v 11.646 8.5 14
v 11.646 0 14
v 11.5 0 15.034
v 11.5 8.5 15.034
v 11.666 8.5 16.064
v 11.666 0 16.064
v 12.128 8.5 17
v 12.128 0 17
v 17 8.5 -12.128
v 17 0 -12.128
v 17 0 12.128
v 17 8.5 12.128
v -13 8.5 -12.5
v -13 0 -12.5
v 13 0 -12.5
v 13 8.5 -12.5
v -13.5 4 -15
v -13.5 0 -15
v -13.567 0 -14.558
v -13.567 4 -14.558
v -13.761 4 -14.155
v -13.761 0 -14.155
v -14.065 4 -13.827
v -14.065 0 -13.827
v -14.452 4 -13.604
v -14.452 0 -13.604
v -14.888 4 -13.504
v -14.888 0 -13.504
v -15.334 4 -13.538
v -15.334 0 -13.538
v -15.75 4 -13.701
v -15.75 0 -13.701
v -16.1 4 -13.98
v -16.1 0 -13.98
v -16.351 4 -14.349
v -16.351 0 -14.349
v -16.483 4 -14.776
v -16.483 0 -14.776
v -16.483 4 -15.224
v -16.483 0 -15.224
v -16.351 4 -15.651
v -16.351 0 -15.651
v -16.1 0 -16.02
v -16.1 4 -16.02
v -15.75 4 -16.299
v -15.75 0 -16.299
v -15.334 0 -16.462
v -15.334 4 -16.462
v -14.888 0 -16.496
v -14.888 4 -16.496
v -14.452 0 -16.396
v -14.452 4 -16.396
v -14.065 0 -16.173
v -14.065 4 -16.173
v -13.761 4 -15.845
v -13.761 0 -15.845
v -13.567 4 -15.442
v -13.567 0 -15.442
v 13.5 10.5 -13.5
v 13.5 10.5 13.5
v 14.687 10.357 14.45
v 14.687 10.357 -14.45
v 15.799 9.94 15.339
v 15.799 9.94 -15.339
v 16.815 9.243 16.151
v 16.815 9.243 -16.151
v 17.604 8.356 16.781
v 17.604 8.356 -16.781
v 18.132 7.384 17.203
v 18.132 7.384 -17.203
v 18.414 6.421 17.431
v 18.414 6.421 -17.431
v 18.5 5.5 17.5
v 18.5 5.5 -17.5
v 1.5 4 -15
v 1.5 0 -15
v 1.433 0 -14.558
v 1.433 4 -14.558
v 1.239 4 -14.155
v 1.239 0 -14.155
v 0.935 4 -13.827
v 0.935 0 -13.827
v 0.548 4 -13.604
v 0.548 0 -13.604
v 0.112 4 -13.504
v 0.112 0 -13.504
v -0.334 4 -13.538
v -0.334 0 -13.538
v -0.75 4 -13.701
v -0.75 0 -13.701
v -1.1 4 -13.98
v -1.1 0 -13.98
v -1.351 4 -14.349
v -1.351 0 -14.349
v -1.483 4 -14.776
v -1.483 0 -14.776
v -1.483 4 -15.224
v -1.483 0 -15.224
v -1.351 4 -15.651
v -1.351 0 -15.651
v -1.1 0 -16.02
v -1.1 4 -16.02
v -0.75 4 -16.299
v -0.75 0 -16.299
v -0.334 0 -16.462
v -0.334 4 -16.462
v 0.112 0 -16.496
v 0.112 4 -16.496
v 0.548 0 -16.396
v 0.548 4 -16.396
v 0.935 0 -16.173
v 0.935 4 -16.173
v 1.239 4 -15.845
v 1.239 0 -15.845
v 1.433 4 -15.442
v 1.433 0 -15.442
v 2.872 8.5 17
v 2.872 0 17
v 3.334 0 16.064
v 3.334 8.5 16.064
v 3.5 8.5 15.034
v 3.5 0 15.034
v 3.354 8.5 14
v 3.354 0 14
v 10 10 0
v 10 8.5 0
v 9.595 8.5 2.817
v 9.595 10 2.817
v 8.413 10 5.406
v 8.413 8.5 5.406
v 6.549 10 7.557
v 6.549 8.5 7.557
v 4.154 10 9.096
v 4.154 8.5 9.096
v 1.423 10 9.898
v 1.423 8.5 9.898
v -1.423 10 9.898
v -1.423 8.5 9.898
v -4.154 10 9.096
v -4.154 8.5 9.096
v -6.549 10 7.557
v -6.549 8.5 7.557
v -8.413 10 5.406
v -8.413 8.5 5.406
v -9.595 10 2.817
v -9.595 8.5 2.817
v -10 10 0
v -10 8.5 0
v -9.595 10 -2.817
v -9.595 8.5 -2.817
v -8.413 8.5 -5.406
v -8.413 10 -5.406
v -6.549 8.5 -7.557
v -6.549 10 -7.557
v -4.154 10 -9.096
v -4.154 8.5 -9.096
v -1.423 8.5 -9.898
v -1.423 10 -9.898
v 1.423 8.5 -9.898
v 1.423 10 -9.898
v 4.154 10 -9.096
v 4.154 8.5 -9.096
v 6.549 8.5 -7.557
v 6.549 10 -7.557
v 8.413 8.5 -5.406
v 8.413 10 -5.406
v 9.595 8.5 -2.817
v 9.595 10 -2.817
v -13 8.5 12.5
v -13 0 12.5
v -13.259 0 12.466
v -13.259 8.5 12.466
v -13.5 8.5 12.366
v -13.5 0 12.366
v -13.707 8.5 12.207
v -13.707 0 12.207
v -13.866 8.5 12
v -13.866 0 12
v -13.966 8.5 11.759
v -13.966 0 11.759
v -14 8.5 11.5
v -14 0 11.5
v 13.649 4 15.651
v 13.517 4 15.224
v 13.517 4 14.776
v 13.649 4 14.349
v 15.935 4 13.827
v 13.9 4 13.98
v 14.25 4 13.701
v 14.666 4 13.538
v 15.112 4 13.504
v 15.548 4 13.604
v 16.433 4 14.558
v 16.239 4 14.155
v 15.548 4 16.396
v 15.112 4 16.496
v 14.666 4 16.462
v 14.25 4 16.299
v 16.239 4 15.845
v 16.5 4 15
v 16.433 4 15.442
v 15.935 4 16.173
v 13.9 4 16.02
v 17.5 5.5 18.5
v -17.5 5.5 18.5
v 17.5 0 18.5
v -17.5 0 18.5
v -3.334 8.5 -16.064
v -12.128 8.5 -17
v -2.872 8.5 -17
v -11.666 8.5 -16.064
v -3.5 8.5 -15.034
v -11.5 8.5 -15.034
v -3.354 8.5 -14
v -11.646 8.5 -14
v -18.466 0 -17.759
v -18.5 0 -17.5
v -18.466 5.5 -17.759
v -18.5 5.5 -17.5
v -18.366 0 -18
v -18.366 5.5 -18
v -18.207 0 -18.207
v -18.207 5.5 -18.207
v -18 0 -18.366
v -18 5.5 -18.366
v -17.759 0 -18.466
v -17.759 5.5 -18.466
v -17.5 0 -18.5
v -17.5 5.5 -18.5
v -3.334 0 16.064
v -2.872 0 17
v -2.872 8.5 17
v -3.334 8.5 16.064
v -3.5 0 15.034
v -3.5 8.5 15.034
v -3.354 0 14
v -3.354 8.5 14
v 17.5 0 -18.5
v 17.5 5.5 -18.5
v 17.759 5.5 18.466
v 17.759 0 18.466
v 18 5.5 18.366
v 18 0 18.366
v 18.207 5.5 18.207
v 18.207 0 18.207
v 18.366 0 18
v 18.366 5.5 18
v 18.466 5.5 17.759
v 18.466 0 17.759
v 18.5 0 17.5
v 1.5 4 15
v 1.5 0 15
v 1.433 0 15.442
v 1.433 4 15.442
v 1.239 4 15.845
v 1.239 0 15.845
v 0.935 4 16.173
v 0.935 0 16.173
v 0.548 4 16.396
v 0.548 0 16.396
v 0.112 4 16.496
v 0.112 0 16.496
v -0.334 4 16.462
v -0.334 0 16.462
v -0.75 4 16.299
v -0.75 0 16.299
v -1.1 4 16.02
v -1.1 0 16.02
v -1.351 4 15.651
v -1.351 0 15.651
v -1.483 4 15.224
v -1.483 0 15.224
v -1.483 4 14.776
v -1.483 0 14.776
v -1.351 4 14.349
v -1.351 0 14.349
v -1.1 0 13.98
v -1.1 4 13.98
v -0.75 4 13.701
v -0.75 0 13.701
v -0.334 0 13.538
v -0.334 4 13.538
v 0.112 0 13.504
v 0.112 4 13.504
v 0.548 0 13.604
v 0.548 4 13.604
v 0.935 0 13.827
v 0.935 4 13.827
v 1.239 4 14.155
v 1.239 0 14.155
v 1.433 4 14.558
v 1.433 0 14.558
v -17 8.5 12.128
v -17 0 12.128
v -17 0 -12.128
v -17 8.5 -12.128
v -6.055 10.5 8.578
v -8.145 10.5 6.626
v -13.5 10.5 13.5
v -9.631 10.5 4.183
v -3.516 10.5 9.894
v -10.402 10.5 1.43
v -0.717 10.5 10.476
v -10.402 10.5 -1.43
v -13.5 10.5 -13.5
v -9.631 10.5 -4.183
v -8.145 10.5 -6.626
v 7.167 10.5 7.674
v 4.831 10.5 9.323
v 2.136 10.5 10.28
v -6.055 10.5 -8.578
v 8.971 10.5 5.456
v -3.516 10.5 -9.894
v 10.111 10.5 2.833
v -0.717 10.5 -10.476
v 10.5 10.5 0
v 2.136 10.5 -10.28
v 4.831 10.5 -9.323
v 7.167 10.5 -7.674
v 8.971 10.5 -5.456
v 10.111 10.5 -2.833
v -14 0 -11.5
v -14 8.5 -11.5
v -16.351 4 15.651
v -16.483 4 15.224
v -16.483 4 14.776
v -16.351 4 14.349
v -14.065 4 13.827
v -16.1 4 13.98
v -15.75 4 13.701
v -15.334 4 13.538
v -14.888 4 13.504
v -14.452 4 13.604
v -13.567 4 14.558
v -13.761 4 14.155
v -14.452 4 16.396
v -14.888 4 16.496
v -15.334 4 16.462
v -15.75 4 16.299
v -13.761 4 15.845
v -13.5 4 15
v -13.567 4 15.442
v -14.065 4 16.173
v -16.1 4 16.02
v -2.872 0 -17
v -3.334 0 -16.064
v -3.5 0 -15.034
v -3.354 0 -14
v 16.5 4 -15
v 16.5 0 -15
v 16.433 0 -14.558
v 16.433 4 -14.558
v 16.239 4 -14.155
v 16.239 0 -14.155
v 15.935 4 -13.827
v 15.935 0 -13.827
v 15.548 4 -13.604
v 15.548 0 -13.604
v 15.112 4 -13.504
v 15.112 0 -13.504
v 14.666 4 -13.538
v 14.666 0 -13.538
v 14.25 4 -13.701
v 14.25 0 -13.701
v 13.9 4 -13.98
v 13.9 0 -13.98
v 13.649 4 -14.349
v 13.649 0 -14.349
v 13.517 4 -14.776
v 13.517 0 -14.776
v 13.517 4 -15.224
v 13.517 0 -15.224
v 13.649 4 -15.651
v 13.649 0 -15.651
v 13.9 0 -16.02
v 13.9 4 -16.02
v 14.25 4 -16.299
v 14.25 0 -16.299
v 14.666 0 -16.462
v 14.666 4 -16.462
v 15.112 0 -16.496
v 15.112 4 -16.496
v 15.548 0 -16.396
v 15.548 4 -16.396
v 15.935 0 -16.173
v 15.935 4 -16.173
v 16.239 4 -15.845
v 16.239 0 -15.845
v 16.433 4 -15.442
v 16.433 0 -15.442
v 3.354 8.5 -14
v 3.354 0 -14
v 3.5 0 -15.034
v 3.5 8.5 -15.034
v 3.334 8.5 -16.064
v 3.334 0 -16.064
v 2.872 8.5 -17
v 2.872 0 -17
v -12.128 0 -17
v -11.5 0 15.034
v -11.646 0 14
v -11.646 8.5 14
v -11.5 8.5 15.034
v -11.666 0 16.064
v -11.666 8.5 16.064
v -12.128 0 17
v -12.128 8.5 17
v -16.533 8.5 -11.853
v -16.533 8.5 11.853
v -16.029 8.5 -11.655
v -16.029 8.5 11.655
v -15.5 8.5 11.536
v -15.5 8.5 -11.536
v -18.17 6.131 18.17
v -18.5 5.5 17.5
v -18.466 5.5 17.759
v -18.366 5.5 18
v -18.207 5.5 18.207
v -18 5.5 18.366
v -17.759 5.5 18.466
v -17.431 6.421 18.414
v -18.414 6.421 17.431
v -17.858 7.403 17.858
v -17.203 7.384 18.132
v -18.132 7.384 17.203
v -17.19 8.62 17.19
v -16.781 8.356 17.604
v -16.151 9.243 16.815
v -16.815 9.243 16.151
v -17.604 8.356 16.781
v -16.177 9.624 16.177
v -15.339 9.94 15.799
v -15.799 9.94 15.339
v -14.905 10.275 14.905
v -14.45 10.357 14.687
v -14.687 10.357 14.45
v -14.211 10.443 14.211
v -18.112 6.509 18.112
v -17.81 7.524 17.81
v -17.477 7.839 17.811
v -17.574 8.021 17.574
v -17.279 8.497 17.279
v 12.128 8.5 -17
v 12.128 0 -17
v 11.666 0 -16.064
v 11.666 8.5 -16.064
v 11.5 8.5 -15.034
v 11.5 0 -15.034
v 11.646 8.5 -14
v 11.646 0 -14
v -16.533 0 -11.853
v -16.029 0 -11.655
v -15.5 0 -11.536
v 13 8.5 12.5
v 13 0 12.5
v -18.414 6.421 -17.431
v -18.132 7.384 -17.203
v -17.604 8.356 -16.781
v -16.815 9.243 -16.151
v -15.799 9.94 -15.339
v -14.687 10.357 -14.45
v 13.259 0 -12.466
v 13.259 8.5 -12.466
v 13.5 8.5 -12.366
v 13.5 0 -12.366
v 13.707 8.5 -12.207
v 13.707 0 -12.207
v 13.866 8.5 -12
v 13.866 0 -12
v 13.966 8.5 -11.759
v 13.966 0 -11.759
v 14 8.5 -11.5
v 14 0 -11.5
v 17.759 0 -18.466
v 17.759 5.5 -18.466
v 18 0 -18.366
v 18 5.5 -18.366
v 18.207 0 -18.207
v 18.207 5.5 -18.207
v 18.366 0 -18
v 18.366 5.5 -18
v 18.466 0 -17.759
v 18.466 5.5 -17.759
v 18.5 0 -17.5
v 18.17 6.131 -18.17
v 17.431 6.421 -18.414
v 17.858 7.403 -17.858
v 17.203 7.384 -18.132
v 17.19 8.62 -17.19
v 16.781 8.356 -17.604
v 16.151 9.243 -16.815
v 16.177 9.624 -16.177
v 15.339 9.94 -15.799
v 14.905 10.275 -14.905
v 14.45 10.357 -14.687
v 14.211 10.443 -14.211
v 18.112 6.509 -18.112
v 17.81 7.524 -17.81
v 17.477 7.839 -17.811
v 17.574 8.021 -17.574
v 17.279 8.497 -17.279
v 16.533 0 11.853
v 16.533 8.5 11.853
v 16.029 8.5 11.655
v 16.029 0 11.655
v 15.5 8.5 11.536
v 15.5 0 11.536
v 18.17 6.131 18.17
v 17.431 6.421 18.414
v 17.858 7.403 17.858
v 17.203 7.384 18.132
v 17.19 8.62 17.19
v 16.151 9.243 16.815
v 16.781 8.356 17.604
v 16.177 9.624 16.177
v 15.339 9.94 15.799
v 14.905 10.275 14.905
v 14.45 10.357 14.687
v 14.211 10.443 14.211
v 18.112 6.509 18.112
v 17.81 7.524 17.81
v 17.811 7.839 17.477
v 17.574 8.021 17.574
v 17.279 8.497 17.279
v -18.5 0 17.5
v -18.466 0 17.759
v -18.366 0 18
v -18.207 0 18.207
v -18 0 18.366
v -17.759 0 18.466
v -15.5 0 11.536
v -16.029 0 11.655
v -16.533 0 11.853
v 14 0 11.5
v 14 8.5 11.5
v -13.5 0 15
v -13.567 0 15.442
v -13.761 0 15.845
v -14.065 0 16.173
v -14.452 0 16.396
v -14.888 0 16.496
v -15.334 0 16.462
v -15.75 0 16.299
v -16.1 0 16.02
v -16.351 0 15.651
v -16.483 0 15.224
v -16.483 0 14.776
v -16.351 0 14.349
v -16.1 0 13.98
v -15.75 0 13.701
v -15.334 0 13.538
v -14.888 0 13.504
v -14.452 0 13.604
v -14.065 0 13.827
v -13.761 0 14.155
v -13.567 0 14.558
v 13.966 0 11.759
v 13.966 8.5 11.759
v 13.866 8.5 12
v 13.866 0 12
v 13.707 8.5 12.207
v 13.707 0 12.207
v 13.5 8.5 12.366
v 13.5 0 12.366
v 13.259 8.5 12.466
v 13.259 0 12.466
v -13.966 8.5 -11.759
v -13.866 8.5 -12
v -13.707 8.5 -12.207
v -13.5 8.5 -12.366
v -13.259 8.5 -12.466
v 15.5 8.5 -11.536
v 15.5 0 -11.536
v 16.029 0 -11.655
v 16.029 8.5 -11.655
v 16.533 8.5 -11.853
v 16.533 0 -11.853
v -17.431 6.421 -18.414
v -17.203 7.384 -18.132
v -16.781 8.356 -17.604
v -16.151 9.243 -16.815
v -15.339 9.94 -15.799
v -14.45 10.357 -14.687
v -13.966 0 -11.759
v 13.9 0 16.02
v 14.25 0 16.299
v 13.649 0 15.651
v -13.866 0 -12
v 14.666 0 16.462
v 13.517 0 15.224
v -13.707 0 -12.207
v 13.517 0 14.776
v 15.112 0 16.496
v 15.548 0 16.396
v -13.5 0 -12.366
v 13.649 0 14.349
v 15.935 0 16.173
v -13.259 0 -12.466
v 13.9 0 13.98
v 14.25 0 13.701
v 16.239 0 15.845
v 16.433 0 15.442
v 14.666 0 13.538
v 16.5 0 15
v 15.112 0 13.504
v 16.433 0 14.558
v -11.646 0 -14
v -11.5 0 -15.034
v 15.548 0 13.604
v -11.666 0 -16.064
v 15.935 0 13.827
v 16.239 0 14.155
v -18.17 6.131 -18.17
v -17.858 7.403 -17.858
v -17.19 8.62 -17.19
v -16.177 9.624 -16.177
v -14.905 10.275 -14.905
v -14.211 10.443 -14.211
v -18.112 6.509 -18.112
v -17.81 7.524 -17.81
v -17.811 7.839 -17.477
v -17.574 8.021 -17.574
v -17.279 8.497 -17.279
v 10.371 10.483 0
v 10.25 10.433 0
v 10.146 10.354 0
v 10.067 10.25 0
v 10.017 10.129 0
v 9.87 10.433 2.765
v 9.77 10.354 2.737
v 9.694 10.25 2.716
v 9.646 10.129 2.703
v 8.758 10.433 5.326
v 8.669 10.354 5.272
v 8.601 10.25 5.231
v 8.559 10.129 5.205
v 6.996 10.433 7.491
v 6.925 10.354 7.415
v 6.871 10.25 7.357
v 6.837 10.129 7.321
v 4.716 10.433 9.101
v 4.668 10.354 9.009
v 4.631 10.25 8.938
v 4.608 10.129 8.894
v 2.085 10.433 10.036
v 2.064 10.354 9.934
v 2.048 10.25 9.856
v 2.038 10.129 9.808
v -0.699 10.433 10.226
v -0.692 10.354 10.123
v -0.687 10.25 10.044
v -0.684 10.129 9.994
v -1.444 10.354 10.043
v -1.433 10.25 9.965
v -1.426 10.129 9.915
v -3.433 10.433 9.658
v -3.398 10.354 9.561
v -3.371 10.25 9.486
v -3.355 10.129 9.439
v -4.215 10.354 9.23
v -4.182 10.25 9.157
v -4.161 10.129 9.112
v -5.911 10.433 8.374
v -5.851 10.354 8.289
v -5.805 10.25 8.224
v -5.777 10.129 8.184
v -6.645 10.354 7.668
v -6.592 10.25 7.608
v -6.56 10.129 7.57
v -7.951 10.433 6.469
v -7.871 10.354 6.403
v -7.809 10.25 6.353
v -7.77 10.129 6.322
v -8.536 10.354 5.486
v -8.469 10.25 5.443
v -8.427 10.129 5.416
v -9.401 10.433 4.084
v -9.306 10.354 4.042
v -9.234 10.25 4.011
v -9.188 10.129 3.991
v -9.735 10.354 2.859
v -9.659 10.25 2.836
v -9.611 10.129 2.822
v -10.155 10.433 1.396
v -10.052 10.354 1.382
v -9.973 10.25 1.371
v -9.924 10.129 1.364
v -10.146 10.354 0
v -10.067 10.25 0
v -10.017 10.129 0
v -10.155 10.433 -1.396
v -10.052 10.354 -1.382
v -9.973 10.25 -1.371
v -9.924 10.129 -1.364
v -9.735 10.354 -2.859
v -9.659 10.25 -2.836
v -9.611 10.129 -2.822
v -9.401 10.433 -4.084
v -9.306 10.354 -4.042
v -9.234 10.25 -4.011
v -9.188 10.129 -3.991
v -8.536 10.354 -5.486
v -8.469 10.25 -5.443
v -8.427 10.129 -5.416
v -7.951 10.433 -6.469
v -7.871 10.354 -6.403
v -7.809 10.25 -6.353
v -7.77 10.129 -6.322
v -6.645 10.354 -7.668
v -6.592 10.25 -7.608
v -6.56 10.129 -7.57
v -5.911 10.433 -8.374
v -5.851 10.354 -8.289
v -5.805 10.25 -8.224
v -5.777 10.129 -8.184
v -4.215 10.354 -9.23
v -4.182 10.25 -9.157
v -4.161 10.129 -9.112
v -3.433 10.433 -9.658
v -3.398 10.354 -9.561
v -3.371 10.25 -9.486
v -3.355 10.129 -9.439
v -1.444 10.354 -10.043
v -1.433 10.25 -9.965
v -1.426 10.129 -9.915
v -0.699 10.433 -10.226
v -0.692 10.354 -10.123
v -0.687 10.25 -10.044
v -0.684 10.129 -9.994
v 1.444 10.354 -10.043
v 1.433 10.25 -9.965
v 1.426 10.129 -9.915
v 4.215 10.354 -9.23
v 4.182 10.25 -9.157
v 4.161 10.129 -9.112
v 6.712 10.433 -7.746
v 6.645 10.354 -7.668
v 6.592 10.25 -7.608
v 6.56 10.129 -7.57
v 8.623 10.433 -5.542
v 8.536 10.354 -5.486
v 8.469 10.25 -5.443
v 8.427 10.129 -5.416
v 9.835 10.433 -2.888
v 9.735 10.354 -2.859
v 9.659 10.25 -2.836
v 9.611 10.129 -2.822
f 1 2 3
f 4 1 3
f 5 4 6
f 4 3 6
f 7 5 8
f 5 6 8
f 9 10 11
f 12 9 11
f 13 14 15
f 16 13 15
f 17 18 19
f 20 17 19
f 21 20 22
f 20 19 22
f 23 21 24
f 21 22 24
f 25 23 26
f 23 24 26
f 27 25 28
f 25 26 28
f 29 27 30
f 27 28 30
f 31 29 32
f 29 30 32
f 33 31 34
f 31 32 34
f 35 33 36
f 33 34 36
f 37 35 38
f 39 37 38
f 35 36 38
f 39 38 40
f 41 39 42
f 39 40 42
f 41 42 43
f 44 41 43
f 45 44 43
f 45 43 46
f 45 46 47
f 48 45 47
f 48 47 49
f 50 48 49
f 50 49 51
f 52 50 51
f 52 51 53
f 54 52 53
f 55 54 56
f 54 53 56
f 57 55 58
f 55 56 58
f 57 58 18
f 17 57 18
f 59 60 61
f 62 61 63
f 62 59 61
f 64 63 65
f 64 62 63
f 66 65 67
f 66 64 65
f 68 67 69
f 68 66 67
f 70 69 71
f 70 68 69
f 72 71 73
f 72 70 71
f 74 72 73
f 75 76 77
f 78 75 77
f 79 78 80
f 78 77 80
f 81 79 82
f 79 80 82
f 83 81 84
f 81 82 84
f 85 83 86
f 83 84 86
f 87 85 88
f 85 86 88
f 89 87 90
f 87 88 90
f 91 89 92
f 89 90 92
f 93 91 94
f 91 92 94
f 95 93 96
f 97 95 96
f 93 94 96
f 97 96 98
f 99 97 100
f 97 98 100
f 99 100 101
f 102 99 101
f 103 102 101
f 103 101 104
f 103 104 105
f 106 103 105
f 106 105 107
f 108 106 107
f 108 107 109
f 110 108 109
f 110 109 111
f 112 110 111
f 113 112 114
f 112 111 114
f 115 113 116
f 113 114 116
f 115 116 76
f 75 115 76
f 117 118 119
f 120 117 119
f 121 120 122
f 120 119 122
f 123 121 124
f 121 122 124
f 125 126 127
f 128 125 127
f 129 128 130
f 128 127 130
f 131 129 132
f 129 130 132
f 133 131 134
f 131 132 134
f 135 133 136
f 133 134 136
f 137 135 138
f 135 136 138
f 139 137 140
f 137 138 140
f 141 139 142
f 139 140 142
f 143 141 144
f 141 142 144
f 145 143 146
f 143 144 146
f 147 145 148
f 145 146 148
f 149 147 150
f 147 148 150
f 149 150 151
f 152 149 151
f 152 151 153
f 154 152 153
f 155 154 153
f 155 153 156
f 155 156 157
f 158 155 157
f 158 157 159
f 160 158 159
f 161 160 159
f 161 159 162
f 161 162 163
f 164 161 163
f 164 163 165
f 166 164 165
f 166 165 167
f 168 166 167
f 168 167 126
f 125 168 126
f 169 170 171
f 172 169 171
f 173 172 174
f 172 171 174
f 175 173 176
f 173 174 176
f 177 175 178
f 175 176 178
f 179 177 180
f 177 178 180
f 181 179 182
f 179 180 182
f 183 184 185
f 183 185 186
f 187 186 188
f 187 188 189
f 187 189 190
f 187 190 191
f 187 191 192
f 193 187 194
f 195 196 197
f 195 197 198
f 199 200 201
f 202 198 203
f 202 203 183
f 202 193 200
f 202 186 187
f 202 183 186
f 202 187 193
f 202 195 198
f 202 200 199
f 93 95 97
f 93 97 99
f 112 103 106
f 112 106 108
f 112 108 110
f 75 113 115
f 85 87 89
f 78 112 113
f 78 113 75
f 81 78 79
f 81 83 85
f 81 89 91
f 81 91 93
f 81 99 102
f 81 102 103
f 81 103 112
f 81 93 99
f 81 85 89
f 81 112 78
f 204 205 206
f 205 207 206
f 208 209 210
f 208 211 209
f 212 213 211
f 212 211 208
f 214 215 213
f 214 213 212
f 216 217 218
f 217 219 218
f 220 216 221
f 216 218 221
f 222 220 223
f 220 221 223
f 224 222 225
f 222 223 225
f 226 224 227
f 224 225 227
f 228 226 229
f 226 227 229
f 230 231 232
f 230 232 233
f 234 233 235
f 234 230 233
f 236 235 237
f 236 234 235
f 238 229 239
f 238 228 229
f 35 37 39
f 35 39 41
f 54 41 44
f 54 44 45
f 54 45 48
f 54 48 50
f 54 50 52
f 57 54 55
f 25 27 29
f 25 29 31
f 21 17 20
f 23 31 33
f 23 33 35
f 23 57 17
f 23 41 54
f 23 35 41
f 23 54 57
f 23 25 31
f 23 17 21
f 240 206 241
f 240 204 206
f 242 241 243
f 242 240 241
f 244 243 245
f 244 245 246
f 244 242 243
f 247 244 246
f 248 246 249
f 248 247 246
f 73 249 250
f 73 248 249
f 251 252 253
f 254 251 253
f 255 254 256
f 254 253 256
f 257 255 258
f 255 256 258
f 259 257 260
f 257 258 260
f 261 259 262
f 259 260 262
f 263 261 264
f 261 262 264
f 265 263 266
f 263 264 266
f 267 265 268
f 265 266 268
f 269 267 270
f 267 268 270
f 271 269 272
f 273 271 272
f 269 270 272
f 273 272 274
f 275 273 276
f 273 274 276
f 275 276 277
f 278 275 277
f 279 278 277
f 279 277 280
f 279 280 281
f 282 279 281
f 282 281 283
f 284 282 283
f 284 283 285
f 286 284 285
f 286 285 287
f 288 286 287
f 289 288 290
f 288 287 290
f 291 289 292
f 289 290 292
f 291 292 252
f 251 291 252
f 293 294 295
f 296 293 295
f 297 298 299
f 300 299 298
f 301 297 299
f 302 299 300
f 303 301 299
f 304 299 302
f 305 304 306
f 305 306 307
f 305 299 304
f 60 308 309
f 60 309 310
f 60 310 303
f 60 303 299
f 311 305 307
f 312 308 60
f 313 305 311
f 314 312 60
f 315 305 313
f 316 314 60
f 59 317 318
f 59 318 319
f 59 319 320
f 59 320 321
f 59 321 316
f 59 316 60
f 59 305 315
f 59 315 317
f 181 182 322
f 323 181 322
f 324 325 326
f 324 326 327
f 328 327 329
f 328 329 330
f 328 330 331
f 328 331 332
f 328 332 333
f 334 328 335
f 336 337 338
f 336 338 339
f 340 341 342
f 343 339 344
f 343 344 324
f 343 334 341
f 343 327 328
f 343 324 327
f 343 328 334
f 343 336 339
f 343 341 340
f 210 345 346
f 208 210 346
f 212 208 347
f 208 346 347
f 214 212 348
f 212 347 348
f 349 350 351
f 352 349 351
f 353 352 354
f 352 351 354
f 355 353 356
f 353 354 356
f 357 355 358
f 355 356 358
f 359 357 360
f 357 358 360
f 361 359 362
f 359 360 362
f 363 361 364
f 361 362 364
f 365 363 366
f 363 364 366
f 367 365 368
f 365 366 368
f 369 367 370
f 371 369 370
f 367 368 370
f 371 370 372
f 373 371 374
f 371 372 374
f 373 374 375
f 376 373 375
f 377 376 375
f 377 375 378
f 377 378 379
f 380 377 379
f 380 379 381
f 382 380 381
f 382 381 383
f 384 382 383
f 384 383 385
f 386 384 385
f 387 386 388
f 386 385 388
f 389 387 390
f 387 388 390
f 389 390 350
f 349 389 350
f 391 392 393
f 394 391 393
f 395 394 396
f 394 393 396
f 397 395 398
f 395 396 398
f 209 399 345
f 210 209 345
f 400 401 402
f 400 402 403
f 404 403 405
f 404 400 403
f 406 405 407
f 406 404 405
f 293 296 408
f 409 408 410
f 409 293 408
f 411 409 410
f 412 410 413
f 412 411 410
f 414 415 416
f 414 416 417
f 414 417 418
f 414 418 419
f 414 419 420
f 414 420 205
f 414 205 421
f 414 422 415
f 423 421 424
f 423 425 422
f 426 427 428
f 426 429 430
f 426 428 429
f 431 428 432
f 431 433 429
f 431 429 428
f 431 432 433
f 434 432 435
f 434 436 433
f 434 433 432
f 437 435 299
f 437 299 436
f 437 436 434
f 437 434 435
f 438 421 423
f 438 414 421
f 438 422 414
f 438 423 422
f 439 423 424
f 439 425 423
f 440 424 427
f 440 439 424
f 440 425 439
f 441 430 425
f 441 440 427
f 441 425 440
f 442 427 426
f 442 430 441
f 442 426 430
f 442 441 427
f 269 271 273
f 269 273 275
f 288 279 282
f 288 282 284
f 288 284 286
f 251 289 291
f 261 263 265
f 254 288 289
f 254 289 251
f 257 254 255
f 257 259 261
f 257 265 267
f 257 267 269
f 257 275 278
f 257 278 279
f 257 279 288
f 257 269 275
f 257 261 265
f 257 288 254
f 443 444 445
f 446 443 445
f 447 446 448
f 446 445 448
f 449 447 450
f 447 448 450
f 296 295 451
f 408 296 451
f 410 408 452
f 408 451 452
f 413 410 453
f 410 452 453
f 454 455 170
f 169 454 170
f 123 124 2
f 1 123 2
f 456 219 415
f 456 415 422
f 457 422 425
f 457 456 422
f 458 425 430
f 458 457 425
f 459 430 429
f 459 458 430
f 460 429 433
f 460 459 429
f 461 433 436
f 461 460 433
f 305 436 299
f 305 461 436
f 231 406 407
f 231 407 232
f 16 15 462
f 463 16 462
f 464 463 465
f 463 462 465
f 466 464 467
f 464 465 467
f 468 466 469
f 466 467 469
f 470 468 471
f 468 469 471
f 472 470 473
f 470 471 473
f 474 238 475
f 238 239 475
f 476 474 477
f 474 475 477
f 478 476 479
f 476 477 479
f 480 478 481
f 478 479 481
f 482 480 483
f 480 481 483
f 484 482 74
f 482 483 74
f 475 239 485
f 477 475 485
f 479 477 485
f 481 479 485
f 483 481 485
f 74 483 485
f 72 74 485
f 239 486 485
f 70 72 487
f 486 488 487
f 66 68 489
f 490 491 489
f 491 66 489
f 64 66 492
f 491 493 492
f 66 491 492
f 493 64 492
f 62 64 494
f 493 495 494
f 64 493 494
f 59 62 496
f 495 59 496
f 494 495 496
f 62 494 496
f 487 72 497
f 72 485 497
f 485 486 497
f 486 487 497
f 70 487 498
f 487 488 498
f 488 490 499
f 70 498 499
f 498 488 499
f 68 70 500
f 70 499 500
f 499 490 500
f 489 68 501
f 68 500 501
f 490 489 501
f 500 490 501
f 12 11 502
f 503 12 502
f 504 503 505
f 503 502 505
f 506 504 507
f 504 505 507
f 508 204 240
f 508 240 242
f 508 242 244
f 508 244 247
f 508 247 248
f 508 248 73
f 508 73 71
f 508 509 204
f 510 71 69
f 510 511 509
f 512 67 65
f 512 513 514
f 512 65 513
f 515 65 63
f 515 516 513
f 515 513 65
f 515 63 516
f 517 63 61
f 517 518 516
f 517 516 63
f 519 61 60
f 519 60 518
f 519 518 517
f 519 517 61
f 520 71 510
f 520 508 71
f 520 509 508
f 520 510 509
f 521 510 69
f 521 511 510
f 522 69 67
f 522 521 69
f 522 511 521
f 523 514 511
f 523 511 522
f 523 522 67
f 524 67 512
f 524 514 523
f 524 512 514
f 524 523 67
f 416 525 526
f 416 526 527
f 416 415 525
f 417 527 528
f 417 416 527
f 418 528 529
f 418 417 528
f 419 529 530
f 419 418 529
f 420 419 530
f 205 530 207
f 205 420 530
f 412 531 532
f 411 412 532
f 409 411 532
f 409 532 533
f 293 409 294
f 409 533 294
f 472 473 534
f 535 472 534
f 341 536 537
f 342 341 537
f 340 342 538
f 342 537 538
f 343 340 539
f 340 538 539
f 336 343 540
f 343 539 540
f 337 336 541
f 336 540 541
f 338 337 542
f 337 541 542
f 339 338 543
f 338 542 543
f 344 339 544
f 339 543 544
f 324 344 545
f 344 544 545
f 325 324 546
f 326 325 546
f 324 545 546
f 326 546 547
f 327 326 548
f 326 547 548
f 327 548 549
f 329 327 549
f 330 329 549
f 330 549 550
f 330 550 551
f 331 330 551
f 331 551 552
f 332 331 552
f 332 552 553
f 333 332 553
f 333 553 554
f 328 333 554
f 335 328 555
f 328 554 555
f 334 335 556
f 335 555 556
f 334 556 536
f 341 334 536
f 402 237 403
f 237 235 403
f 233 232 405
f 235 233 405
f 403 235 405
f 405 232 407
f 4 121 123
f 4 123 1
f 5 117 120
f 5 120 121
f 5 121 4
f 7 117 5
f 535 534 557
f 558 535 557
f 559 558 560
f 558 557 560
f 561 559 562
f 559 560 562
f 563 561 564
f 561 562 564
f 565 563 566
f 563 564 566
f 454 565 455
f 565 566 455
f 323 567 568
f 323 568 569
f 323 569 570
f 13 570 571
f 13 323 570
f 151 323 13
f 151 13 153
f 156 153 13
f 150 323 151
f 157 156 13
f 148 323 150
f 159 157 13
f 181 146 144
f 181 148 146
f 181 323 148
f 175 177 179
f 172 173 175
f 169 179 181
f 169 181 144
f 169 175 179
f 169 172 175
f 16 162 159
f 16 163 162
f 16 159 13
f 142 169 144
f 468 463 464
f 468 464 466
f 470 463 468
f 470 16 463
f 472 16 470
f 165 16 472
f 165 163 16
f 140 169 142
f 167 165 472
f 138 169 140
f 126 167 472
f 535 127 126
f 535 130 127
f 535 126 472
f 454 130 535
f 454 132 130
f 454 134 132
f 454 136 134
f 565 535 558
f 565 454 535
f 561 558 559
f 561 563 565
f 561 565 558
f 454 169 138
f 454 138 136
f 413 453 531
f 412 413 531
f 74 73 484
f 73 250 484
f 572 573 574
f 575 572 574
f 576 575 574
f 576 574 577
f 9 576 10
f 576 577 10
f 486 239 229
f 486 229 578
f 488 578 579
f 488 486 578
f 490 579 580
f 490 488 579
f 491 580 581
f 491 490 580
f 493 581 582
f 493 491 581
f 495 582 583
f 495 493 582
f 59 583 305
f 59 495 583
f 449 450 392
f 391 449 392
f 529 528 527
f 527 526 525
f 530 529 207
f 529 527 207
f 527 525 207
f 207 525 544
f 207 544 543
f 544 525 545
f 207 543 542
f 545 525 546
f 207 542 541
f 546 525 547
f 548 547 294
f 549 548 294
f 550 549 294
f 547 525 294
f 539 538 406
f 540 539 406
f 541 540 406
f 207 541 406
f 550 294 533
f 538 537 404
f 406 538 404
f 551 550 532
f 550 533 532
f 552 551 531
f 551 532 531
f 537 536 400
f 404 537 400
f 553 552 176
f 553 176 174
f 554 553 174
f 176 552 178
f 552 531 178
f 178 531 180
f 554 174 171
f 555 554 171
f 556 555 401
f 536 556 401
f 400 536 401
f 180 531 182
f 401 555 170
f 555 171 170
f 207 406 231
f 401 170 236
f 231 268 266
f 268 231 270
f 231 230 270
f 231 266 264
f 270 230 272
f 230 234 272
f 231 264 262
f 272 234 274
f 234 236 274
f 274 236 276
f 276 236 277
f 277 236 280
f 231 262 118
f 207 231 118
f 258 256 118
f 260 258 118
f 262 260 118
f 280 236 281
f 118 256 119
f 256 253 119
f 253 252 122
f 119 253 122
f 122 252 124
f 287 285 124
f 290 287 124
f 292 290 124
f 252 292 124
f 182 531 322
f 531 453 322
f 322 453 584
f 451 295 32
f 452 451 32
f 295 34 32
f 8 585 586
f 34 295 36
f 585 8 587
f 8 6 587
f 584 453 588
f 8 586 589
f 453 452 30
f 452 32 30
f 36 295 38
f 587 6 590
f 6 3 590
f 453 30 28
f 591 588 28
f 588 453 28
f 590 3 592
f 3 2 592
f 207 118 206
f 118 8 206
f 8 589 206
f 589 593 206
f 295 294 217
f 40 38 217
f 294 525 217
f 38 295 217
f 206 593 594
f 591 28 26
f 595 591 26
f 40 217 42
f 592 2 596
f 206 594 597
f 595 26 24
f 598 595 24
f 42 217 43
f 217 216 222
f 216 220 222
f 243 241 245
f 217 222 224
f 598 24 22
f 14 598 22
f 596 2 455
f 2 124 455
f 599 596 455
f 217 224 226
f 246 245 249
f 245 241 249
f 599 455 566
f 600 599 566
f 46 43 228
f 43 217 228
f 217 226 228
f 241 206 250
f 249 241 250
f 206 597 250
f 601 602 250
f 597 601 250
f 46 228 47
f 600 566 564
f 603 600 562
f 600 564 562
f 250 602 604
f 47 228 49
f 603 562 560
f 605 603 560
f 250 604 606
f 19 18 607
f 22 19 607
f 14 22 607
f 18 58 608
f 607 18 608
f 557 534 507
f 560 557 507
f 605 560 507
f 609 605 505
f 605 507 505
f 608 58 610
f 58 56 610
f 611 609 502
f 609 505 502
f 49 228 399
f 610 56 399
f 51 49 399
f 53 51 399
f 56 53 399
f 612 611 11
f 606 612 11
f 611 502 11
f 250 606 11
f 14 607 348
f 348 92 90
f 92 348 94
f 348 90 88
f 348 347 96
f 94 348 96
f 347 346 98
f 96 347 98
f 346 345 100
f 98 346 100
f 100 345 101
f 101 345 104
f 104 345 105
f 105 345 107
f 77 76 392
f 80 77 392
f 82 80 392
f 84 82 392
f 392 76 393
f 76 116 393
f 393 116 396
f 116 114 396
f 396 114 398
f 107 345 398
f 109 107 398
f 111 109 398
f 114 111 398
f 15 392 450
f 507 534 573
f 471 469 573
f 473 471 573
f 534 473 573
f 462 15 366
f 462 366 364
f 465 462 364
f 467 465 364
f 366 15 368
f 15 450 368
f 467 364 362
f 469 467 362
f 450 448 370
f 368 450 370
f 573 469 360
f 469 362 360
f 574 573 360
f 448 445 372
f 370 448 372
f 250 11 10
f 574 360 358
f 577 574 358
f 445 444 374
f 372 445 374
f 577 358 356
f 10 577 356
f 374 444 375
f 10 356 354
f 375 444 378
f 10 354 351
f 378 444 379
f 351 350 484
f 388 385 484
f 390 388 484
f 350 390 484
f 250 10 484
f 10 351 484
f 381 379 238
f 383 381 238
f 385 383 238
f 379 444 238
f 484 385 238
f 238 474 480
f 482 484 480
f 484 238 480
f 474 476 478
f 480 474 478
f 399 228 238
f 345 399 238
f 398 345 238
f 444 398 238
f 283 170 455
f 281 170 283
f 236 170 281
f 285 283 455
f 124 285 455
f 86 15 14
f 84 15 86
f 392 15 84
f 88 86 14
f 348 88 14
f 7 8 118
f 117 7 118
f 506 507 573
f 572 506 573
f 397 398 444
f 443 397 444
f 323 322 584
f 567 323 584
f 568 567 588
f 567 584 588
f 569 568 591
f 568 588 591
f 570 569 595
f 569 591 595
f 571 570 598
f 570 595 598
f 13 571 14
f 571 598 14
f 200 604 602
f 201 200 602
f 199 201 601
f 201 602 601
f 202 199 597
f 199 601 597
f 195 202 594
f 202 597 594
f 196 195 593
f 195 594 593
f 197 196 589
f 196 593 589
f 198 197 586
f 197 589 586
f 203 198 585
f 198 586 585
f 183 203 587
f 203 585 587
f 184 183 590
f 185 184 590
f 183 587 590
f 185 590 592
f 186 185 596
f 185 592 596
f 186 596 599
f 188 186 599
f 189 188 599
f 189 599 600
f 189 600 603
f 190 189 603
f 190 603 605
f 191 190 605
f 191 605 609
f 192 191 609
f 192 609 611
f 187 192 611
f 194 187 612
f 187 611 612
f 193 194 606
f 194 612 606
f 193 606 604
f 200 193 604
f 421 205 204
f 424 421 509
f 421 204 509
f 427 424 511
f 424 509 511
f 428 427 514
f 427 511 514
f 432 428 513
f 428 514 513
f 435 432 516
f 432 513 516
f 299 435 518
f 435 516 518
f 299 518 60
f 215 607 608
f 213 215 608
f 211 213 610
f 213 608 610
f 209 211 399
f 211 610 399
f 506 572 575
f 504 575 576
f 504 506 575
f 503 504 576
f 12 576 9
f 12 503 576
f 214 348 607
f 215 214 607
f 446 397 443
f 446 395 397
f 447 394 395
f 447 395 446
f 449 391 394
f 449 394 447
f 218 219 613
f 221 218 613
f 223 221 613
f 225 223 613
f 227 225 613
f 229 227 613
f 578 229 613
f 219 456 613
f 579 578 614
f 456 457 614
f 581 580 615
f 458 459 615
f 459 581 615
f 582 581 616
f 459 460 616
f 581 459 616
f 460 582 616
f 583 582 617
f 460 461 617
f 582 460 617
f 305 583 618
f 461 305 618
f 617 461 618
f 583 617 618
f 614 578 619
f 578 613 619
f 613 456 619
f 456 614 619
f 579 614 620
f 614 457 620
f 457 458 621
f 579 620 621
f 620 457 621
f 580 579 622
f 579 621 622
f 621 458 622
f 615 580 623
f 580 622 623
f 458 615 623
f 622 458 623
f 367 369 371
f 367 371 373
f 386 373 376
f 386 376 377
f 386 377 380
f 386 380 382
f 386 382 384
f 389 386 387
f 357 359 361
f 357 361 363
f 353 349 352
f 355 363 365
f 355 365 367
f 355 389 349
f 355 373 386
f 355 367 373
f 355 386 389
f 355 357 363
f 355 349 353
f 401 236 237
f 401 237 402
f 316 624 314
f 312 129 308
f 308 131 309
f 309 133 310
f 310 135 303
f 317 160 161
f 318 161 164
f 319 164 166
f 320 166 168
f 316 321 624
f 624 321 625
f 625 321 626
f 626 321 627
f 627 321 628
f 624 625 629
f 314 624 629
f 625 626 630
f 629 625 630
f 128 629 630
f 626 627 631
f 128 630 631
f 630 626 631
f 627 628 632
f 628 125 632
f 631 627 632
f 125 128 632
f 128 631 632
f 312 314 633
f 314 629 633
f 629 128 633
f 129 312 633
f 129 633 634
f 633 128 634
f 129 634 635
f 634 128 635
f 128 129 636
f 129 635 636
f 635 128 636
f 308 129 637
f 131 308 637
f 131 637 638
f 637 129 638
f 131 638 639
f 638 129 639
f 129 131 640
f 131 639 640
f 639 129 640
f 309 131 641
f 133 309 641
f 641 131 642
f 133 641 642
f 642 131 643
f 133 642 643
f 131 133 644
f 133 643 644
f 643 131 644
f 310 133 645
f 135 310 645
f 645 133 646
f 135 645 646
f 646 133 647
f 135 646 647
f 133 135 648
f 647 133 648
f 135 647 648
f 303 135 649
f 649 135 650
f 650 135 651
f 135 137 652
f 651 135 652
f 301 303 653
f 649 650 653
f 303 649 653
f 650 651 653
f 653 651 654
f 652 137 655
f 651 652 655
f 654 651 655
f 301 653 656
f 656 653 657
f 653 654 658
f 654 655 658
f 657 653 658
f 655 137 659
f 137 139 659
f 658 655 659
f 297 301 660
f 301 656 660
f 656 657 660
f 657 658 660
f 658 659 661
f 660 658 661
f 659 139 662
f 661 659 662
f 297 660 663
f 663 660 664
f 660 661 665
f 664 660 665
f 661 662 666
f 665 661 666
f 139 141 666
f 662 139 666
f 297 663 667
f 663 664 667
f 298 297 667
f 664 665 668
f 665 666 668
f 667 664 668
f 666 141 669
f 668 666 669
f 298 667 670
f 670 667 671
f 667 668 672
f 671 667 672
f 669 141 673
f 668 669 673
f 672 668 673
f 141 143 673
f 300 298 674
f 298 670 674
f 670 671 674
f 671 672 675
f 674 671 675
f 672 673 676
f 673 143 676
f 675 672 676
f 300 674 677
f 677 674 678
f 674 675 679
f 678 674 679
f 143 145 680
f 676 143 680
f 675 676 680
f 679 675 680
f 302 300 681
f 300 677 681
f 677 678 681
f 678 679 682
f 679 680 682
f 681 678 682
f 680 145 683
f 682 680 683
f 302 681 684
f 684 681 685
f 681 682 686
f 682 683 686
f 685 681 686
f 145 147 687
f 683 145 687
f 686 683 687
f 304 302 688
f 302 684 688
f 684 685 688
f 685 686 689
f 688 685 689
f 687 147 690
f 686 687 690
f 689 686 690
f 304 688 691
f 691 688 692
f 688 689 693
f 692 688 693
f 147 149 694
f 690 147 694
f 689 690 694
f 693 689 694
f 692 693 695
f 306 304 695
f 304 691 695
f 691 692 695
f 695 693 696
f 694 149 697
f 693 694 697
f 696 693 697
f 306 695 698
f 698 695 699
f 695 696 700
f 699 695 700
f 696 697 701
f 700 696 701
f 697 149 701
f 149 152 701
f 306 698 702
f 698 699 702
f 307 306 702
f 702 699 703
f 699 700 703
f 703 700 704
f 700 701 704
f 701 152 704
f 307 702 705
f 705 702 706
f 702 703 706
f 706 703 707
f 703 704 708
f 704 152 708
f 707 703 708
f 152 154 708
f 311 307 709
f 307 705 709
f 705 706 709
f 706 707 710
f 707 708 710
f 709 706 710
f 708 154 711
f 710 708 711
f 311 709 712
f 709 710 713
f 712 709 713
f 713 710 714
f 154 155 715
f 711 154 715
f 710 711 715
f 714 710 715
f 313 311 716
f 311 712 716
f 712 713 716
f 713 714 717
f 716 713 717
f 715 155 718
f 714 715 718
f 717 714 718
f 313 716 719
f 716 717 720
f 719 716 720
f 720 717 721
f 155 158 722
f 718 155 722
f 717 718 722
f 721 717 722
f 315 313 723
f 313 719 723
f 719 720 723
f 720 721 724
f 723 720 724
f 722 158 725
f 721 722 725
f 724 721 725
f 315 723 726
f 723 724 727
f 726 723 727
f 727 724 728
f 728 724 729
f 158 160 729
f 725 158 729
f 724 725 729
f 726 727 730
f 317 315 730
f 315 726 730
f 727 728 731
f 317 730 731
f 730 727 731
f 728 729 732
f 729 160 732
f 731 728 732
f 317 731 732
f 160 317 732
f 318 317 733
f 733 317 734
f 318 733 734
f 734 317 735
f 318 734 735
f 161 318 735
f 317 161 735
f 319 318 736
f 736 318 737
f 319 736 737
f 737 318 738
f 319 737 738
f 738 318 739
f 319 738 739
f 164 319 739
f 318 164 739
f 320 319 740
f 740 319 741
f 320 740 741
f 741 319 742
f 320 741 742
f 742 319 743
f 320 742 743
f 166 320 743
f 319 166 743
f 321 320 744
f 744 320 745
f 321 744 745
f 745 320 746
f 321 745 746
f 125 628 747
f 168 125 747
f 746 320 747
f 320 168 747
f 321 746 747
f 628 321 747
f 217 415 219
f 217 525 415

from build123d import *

# Parameters (mm, degrees)
SKETCH_1_W          = 37
SKETCH_1_H          = 37
EXTRUDE_1_DEPTH     = 10.5
SKETCH_2_R          = 10
CUT_EXTRUDE_1_DEPTH = 11.5
FILLET_1_R          = 5
FILLET_2_R          = 1
SKETCH_3_R          = 1.5
CUT_EXTRUDE_2_DEPTH = 4
CUT_EXTRUDE_3_DEPTH = 8.5
CUT_EXTRUDE_4_DEPTH = 8.5
FILLET_4_R          = 0.5


with BuildPart() as part:
    # 草图1 → 凸台-拉伸1 (new body)
    with BuildSketch(Plane(origin=(0, 0, 0), x_dir=(1, 0, 0), z_dir=(0, 1, 0))):
        Rectangle(SKETCH_1_W, SKETCH_1_H)
    extrude(amount=EXTRUDE_1_DEPTH)

    # 草图2 → 切除-拉伸1 (cut, through all)
    with BuildSketch(Plane.XZ):
        Circle(SKETCH_2_R)
    extrude(amount=-CUT_EXTRUDE_1_DEPTH, mode=Mode.SUBTRACT)

    # 圆角1
    fillet_1_edges = [part.edges().sort_by_distance(p)[0] for p in [
        (-18.5, 10.5, 0),
        (0, 10.5, 18.5),
        (18.5, 10.5, 0),
        (0, 10.5, -18.5),
    ]]
    fillet(fillet_1_edges, radius=FILLET_1_R)

    # 圆角2
    fillet_2_edges = [part.edges().sort_by_distance(p)[0] for p in [
        (18.5, 2.75, -18.5),
        (18.5, 2.75, 18.5),
        (-18.5, 2.75, 18.5),
        (-18.5, 2.75, -18.5),
        (-16.730244537, 9.316480084, 16.730244537),
        (-16.730244537, 9.316480084, -16.730244537),
        (16.730244537, 9.316480084, 16.730244537),
        (16.730244537, 9.316480084, -16.730244537),
    ]]
    fillet(fillet_2_edges, radius=FILLET_2_R)

    # 草图3 → 切除-拉伸2 (cut)
    with BuildSketch(Plane.XZ):
        with Locations((15, 15)):
            Circle(SKETCH_3_R)
        with Locations((15, -15)):
            Circle(SKETCH_3_R)
        with Locations((0, -15)):
            Circle(SKETCH_3_R)
        with Locations((-15, -15)):
            Circle(SKETCH_3_R)
        with Locations((-15, 15)):
            Circle(SKETCH_3_R)
        with Locations((0, 15)):
            Circle(SKETCH_3_R)
    extrude(amount=-CUT_EXTRUDE_2_DEPTH, mode=Mode.SUBTRACT)

    # 草图4 → 切除-拉伸3 (cut)
    with BuildSketch(Plane.XZ):
        with BuildLine():
            Line((13, 12.5), (-13, 12.5))
            ThreePointArc((-13, 12.5), (-13.707106781, 12.207106781), (-14, 11.5))
            Line((-14, 11.5), (-14, -11.5))
            ThreePointArc((-14, -11.5), (-13.707106781, -12.207106781), (-13, -12.5))
            Line((-13, -12.5), (13, -12.5))
            ThreePointArc((13, -12.5), (13.707106781, -12.207106781), (14, -11.5))
            Line((14, -11.5), (14, 11.5))
            ThreePointArc((14, 11.5), (13.707106781, 12.207106781), (13, 12.5))
        make_face()
    extrude(amount=-CUT_EXTRUDE_3_DEPTH, mode=Mode.SUBTRACT)

    # 草图5 → 切除-拉伸4 (cut)
    with BuildSketch(Plane.XZ):
        with BuildLine():
            Line((-17, 12.127718677), (-17, -12.127718677))
            ThreePointArc((-17, -12.127718677), (-16.284547708, -11.744245527), (-15.5, -11.535898385))
            Line((-15.5, -11.535898385), (-15.5, 11.535898385))
            ThreePointArc((-15.5, 11.535898385), (-16.284547708, 11.744245527), (-17, 12.127718677))
        make_face()
        with BuildLine():
            Line((-12.127718677, -17), (-2.872281323, -17))
            ThreePointArc((-2.872281323, -17), (-3.455714429, -15.555011516), (-3.354101966, -14))
            Line((-3.354101966, -14), (-11.645898034, -14))
            ThreePointArc((-11.645898034, -14), (-11.544285571, -15.555011516), (-12.127718677, -17))
        make_face()
        with BuildLine():
            Line((17, -12.127718677), (17, 12.127718677))
            ThreePointArc((17, 12.127718677), (16.284547708, 11.744245527), (15.5, 11.535898385))
            Line((15.5, 11.535898385), (15.5, -11.535898385))
            ThreePointArc((15.5, -11.535898385), (16.284547708, -11.744245527), (17, -12.127718677))
        make_face()
        with BuildLine():
            Line((12.127718677, 17), (2.872281323, 17))
            ThreePointArc((2.872281323, 17), (3.455714429, 15.555011516), (3.354101966, 14))
            Line((3.354101966, 14), (11.645898034, 14))
            ThreePointArc((11.645898034, 14), (11.544285571, 15.555011516), (12.127718677, 17))
        make_face()
        with BuildLine():
            Line((-3.354101966, 14), (-11.645898034, 14))
            ThreePointArc((-11.645898034, 14), (-11.544285571, 15.555011516), (-12.127718677, 17))
            Line((-12.127718677, 17), (-2.872281323, 17))
            ThreePointArc((-2.872281323, 17), (-3.455714429, 15.555011516), (-3.354101966, 14))
        make_face()
        with BuildLine():
            Line((2.872281323, -17), (12.127718677, -17))
            ThreePointArc((12.127718677, -17), (11.544285571, -15.555011516), (11.645898034, -14))
            Line((11.645898034, -14), (3.354101966, -14))
            ThreePointArc((3.354101966, -14), (3.455714429, -15.555011516), (2.872281323, -17))
        make_face()
    extrude(amount=-CUT_EXTRUDE_4_DEPTH, mode=Mode.SUBTRACT)

    # 圆角4
    fillet_4_edges = [part.edges().sort_by_distance(p)[0] for p in [
        (-10, 10.5, 0),
    ]]
    fillet(fillet_4_edges, radius=FILLET_4_R)


solid = part.part
